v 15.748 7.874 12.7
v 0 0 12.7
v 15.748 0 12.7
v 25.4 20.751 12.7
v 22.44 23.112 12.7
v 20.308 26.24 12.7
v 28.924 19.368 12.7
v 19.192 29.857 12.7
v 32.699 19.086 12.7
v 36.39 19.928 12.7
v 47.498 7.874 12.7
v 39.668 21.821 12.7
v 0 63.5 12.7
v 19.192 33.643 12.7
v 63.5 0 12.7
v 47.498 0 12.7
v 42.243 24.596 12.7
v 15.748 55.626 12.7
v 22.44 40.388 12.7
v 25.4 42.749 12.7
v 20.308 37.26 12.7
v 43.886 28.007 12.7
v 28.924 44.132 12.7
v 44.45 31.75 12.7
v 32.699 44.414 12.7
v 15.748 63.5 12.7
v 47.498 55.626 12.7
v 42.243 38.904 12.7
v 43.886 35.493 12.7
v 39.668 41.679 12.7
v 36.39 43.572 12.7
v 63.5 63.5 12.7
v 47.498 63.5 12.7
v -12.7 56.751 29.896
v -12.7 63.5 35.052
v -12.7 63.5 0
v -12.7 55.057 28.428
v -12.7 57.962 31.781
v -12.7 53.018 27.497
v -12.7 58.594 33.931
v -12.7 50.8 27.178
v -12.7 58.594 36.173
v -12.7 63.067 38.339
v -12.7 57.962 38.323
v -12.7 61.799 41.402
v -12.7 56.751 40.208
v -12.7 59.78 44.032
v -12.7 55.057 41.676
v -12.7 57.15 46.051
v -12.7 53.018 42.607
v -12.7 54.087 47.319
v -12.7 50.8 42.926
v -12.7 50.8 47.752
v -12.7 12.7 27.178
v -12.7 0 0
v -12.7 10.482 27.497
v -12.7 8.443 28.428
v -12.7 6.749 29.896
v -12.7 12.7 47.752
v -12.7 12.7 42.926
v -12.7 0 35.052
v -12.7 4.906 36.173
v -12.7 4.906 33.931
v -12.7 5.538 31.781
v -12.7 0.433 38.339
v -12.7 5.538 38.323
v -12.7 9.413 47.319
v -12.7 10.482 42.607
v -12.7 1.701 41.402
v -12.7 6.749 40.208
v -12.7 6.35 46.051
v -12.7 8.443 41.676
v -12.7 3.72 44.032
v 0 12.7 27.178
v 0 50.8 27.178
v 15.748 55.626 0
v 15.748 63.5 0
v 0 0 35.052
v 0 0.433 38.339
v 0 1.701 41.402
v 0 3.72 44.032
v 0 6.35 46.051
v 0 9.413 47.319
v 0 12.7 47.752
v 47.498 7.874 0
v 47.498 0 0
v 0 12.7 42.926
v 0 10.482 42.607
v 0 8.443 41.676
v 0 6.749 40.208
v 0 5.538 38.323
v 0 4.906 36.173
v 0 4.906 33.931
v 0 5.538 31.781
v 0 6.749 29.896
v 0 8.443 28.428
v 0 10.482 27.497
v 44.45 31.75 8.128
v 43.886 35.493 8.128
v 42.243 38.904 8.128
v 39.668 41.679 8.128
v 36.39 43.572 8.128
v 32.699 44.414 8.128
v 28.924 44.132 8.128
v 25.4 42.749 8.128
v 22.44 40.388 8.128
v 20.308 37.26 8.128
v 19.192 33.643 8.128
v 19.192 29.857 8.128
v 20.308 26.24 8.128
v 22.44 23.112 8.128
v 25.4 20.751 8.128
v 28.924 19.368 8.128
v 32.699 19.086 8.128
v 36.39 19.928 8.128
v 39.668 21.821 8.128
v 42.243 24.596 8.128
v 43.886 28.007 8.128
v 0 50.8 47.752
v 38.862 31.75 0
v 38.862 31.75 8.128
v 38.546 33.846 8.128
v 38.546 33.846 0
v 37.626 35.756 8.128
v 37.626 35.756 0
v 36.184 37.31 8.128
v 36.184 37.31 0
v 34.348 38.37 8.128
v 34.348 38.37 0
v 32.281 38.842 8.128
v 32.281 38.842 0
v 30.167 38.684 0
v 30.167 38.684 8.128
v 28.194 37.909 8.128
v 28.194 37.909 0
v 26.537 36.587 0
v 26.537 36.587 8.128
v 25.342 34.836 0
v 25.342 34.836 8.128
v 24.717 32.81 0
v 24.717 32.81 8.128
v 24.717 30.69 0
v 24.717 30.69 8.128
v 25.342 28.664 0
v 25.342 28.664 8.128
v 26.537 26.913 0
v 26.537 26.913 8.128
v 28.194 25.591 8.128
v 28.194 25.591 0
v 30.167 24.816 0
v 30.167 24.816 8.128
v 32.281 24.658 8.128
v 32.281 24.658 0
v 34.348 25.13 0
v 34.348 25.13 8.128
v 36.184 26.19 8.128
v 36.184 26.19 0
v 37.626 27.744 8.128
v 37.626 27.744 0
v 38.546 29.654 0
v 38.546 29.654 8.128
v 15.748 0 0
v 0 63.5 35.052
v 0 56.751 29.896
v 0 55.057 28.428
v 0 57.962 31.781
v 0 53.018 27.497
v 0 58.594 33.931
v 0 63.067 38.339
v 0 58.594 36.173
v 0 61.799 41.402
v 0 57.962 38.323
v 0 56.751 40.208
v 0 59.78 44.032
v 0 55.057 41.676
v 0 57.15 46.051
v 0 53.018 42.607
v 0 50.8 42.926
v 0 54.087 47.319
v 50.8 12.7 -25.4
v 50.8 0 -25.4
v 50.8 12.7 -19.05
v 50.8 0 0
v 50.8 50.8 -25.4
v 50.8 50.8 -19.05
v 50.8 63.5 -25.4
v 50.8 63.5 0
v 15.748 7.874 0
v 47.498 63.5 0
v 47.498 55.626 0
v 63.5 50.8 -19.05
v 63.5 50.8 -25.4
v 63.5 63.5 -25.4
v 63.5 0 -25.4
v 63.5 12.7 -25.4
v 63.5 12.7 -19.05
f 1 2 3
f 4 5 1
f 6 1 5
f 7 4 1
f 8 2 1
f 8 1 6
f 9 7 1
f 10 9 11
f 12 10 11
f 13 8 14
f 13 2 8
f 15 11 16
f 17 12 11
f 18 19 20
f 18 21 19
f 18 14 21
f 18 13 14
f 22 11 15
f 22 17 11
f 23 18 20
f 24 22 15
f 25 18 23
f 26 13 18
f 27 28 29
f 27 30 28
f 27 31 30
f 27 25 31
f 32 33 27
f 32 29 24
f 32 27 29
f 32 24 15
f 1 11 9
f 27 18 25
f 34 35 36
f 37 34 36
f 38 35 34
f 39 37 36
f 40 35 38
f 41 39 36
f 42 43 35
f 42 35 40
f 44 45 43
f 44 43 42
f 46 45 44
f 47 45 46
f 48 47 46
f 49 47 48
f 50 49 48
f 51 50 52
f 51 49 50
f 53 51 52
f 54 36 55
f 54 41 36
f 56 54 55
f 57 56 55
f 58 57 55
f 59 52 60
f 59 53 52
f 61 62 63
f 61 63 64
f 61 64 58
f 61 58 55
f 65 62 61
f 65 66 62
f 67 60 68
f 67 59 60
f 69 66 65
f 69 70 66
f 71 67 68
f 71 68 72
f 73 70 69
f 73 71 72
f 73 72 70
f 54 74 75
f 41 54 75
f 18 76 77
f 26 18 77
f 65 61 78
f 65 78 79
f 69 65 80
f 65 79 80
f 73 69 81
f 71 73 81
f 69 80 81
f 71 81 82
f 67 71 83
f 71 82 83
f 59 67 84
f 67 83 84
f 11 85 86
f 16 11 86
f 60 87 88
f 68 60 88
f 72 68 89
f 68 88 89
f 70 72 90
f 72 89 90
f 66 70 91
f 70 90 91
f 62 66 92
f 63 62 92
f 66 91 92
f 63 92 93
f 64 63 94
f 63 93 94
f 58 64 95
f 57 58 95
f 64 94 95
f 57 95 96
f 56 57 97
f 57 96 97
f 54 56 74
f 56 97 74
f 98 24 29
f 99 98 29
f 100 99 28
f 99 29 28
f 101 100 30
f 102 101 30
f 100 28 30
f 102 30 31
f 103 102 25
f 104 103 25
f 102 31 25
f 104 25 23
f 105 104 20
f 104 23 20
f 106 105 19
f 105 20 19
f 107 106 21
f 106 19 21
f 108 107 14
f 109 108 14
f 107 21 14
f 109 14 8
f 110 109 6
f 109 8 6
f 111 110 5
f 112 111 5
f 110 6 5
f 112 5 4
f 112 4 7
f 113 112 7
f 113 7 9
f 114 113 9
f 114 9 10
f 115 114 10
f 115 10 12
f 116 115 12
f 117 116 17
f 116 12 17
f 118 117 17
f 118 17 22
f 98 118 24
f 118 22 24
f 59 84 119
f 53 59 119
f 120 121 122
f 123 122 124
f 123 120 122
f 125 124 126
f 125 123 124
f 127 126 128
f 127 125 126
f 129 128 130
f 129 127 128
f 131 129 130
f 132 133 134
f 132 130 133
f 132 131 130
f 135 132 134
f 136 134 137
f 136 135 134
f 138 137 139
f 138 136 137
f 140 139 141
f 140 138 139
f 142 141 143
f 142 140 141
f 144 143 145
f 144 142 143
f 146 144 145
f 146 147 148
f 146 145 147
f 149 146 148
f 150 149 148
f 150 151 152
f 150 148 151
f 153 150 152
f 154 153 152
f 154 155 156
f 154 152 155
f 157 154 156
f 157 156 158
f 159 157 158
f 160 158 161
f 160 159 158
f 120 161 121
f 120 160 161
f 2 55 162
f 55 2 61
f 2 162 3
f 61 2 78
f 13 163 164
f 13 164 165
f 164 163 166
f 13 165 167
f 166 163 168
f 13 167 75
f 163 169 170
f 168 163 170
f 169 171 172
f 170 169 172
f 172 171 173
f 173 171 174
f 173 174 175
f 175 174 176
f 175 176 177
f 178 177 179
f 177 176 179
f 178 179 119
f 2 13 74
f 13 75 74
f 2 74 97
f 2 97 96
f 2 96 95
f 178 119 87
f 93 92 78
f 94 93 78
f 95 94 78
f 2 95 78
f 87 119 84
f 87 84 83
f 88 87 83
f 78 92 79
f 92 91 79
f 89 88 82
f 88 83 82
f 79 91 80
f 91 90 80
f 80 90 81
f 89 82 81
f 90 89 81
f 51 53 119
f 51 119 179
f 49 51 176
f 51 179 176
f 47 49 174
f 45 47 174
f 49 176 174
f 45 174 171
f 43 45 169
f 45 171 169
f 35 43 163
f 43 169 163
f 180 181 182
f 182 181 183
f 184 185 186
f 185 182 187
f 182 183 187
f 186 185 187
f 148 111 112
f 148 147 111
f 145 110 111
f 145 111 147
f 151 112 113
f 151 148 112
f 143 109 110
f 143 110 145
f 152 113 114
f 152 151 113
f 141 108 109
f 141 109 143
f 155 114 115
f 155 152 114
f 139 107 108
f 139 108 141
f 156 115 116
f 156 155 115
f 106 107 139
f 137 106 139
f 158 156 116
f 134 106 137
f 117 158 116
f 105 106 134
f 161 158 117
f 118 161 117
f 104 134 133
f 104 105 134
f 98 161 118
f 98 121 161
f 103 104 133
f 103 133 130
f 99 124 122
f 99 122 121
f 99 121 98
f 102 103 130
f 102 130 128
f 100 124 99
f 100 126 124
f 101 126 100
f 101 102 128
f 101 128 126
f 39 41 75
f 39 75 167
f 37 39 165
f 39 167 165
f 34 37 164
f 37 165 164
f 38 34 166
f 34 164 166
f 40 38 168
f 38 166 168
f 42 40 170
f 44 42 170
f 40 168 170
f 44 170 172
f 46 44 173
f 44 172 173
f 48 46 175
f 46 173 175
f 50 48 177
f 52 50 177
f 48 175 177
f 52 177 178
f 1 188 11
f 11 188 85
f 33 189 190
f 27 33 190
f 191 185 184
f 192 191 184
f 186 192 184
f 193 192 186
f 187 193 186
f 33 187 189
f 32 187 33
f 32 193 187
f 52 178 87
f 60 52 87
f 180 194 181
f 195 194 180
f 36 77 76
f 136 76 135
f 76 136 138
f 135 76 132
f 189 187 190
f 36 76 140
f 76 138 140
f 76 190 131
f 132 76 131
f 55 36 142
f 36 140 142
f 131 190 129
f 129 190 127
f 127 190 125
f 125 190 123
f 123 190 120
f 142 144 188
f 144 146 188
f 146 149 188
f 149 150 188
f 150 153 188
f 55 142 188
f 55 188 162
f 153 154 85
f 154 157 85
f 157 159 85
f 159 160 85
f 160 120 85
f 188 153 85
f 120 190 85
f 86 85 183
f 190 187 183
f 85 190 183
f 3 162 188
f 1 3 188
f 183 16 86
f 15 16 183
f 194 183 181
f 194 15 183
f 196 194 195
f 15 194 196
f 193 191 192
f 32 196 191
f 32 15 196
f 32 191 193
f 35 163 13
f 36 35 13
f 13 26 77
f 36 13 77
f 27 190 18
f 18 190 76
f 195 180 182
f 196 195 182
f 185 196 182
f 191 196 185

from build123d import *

# Parameters (mm, degrees)
F0_R     = 7.112
F1_DEPTH = 12.7
F3_DEPTH = 12.7
F4_R     = 12.7
F5_DEPTH = 4.572
F7_DEPTH = 12.7


with BuildPart() as f1:
    # F0 (on Top) → F1 (new body)
    with BuildSketch(Plane.XY):
        Polygon((0, 63.5), (0, 0), (15.748, 0), (15.748, 7.874), (47.498, 7.874), (47.498, 0), (63.5, 0), (63.5, 63.5), (47.498, 63.5), (47.498, 55.626), (15.748, 55.626), (15.748, 63.5), align=None)
        with Locations((31.75, 31.75)):
            Circle(F0_R, mode=Mode.SUBTRACT)
    extrude(amount=F1_DEPTH)

    # F2 (on face) → F3 (join)
    with BuildSketch(Plane.YZ.offset(63.5)):
        Polygon((0, -19.05), (0, -25.4), (12.7, -25.4), (12.7, -19.05), (50.8, -19.05), (50.8, -25.4), (63.5, -25.4), (63.5, -19.05), (63.5, 0), (0, 0), align=None)
    extrude(amount=-F3_DEPTH)

    # F4 (on face) → F5 (cut)
    with BuildSketch(Plane.XY.offset(12.7)):
        with Locations((31.75, 31.75)):
            Circle(F4_R)
    extrude(amount=-F5_DEPTH, mode=Mode.SUBTRACT)

    # F6 (on face) → F7 (join)
    with BuildSketch(Plane(origin=(0, 0, 0), x_dir=(0, -1, 0), z_dir=(-1, 0, 0))):
        with BuildLine():
            Line((-63.5, 0), (0, 0))
            Line((0, 0), (0, 35.052))
            ThreePointArc((0, 35.052), (-3.719744, 44.032256), (-12.7, 47.752))
            Line((-12.7, 47.752), (-50.8, 47.752))
            ThreePointArc((-50.8, 47.752), (-59.780256, 44.032256), (-63.5, 35.052))
            Line((-63.5, 35.052), (-63.5, 0))
        make_face()
        with BuildLine():
            ThreePointArc((-50.8, 27.178), (-58.674, 35.052), (-50.8, 42.926))
            Line((-50.8, 42.926), (-12.7, 42.926))
            ThreePointArc((-12.7, 42.926), (-4.826, 35.052), (-12.7, 27.178))
            Line((-12.7, 27.178), (-50.8, 27.178))
        make_face(mode=Mode.SUBTRACT)
    extrude(amount=F7_DEPTH)


solid = f1.part
